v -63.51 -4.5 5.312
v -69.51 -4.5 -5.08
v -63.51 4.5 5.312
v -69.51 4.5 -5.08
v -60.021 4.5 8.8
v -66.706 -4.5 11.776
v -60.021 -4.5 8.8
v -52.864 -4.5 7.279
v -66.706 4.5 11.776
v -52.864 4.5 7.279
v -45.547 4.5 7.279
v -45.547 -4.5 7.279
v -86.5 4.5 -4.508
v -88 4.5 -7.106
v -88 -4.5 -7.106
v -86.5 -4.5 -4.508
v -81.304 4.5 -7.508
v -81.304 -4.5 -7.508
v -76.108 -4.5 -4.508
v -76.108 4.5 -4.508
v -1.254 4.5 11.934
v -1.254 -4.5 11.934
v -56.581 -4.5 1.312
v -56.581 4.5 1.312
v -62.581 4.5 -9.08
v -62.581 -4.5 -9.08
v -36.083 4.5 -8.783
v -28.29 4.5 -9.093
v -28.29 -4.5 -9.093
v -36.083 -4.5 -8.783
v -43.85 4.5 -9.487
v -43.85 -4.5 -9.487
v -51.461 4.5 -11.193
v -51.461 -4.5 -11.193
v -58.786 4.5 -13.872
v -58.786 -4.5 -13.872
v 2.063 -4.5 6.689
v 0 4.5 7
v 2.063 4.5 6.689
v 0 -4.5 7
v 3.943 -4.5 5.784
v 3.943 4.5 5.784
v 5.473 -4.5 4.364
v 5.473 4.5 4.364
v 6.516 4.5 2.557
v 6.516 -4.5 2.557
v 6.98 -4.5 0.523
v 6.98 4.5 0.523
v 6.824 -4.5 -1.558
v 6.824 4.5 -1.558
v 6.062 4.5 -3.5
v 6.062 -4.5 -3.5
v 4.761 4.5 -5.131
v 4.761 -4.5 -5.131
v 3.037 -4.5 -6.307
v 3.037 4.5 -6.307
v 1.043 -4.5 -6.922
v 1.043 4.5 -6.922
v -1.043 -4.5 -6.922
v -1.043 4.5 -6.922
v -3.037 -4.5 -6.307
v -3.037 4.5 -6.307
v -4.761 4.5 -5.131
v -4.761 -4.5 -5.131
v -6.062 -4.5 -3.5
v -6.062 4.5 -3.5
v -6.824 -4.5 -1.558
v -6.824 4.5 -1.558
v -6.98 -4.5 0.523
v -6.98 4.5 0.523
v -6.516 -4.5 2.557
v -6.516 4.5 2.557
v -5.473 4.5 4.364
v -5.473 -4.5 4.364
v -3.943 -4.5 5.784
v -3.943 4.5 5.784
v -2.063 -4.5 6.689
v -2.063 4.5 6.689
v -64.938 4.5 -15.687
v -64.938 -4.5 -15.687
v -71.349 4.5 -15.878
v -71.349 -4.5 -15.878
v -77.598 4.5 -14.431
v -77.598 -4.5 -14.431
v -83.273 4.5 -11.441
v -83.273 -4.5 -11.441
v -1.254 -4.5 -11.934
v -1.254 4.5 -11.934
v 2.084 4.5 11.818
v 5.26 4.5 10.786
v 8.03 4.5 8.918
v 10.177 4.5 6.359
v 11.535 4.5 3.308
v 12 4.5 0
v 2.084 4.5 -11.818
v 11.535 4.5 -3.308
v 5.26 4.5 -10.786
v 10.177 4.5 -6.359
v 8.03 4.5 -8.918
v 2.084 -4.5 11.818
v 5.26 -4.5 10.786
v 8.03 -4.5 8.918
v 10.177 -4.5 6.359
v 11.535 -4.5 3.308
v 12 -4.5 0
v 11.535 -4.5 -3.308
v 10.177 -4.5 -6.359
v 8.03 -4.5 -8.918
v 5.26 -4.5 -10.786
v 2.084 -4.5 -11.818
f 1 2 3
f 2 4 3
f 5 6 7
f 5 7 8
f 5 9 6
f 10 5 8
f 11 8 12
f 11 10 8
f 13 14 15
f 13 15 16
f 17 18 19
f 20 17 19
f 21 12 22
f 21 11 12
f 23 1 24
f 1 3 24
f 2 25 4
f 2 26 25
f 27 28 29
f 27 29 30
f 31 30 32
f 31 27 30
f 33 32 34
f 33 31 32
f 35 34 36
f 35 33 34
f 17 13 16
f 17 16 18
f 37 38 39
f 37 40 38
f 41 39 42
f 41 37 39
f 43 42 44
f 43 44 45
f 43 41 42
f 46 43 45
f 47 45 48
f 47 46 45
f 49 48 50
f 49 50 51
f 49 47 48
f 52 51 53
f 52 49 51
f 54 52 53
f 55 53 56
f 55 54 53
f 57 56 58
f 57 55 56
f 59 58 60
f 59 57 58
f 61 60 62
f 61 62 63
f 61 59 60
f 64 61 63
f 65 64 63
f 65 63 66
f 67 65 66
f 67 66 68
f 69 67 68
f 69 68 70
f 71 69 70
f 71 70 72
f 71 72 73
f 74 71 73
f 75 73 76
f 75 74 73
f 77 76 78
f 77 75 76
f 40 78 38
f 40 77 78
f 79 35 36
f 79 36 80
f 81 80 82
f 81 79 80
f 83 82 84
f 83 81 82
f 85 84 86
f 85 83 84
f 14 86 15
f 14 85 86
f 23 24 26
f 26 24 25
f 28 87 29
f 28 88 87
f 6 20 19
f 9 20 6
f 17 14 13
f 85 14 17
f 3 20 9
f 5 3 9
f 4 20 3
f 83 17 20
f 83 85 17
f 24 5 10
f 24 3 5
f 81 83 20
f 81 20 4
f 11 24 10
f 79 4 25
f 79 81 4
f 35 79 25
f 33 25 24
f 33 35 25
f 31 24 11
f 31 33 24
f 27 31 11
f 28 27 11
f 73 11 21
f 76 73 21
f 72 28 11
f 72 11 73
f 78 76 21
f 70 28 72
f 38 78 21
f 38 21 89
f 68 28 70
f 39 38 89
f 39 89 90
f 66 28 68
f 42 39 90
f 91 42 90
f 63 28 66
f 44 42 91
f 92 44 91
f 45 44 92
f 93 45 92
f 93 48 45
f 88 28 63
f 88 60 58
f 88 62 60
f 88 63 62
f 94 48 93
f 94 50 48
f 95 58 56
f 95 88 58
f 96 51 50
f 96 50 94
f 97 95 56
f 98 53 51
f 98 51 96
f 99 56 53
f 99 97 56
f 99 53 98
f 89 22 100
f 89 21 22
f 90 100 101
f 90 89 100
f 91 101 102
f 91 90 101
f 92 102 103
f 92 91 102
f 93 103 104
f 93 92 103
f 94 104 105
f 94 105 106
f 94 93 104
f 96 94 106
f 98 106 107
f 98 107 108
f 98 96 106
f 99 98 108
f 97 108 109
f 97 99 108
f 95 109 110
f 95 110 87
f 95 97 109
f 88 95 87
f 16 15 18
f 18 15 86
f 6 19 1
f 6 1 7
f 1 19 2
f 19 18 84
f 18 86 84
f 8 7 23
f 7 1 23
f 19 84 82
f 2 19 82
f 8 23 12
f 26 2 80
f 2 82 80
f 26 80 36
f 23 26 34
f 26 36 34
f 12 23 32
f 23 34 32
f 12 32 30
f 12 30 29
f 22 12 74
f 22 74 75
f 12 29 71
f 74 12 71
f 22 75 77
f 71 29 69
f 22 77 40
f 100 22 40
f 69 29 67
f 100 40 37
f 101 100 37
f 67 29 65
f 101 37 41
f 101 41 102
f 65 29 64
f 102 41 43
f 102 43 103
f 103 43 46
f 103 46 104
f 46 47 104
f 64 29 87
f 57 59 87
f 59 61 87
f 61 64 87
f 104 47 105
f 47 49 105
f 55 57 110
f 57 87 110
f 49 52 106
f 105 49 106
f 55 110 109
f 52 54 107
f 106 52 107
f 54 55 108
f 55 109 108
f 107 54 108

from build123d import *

# Parameters (mm, degrees)
SKETCH1_R           = 7
BOSS_EXTRUDE1_DEPTH = 4.5


with BuildPart() as part:
    # Sketch1 → Boss-Extrude1 (new, symmetric)
    with BuildSketch(Plane(origin=(0, 0, 0), x_dir=(1, 0, 0), z_dir=(0, 1, 0))):
        with BuildLine():
            Line((-1.254341559, 11.934262744), (-28.289662127, 9.092736051))
            ThreePointArc((-28.289662127, 9.092736051), (-43.850490966, 9.48747573), (-58.786122703, 13.871779345))
            ThreePointArc((-58.786122703, 13.871779345), (-74.520010862, 15.355444557), (-88, 7.106420865))
            Line((-88, 7.106420865), (-86.5, 4.508344654))
            Line((-86.5, 4.508344654), (-81.303847577, 7.508344654))
            Line((-81.303847577, 7.508344654), (-76.107695155, 4.508344654))
            Line((-76.107695155, 4.508344654), (-66.705771366, -11.776265037))
            ThreePointArc((-66.705771366, -11.776265037), (-56.482680545, -7.851988144), (-45.547275152, -7.278887832))
            Line((-45.547275152, -7.278887832), (-1.254341559, -11.934262744))
            ThreePointArc((-1.254341559, -11.934262744), (12, 0), (-1.254341559, 11.934262744))
        make_face()
        with Locations(Location((0, 0, 0), (0, 0, 270))):
            Circle(SKETCH1_R, mode=Mode.SUBTRACT)
        Polygon((-69.509618943, 5.080141424), (-63.509618943, -5.312163422), (-56.581415713, -1.312163422), (-62.581415713, 9.080141424), align=None, mode=Mode.SUBTRACT)
    extrude(amount=BOSS_EXTRUDE1_DEPTH, both=True)


solid = part.part
